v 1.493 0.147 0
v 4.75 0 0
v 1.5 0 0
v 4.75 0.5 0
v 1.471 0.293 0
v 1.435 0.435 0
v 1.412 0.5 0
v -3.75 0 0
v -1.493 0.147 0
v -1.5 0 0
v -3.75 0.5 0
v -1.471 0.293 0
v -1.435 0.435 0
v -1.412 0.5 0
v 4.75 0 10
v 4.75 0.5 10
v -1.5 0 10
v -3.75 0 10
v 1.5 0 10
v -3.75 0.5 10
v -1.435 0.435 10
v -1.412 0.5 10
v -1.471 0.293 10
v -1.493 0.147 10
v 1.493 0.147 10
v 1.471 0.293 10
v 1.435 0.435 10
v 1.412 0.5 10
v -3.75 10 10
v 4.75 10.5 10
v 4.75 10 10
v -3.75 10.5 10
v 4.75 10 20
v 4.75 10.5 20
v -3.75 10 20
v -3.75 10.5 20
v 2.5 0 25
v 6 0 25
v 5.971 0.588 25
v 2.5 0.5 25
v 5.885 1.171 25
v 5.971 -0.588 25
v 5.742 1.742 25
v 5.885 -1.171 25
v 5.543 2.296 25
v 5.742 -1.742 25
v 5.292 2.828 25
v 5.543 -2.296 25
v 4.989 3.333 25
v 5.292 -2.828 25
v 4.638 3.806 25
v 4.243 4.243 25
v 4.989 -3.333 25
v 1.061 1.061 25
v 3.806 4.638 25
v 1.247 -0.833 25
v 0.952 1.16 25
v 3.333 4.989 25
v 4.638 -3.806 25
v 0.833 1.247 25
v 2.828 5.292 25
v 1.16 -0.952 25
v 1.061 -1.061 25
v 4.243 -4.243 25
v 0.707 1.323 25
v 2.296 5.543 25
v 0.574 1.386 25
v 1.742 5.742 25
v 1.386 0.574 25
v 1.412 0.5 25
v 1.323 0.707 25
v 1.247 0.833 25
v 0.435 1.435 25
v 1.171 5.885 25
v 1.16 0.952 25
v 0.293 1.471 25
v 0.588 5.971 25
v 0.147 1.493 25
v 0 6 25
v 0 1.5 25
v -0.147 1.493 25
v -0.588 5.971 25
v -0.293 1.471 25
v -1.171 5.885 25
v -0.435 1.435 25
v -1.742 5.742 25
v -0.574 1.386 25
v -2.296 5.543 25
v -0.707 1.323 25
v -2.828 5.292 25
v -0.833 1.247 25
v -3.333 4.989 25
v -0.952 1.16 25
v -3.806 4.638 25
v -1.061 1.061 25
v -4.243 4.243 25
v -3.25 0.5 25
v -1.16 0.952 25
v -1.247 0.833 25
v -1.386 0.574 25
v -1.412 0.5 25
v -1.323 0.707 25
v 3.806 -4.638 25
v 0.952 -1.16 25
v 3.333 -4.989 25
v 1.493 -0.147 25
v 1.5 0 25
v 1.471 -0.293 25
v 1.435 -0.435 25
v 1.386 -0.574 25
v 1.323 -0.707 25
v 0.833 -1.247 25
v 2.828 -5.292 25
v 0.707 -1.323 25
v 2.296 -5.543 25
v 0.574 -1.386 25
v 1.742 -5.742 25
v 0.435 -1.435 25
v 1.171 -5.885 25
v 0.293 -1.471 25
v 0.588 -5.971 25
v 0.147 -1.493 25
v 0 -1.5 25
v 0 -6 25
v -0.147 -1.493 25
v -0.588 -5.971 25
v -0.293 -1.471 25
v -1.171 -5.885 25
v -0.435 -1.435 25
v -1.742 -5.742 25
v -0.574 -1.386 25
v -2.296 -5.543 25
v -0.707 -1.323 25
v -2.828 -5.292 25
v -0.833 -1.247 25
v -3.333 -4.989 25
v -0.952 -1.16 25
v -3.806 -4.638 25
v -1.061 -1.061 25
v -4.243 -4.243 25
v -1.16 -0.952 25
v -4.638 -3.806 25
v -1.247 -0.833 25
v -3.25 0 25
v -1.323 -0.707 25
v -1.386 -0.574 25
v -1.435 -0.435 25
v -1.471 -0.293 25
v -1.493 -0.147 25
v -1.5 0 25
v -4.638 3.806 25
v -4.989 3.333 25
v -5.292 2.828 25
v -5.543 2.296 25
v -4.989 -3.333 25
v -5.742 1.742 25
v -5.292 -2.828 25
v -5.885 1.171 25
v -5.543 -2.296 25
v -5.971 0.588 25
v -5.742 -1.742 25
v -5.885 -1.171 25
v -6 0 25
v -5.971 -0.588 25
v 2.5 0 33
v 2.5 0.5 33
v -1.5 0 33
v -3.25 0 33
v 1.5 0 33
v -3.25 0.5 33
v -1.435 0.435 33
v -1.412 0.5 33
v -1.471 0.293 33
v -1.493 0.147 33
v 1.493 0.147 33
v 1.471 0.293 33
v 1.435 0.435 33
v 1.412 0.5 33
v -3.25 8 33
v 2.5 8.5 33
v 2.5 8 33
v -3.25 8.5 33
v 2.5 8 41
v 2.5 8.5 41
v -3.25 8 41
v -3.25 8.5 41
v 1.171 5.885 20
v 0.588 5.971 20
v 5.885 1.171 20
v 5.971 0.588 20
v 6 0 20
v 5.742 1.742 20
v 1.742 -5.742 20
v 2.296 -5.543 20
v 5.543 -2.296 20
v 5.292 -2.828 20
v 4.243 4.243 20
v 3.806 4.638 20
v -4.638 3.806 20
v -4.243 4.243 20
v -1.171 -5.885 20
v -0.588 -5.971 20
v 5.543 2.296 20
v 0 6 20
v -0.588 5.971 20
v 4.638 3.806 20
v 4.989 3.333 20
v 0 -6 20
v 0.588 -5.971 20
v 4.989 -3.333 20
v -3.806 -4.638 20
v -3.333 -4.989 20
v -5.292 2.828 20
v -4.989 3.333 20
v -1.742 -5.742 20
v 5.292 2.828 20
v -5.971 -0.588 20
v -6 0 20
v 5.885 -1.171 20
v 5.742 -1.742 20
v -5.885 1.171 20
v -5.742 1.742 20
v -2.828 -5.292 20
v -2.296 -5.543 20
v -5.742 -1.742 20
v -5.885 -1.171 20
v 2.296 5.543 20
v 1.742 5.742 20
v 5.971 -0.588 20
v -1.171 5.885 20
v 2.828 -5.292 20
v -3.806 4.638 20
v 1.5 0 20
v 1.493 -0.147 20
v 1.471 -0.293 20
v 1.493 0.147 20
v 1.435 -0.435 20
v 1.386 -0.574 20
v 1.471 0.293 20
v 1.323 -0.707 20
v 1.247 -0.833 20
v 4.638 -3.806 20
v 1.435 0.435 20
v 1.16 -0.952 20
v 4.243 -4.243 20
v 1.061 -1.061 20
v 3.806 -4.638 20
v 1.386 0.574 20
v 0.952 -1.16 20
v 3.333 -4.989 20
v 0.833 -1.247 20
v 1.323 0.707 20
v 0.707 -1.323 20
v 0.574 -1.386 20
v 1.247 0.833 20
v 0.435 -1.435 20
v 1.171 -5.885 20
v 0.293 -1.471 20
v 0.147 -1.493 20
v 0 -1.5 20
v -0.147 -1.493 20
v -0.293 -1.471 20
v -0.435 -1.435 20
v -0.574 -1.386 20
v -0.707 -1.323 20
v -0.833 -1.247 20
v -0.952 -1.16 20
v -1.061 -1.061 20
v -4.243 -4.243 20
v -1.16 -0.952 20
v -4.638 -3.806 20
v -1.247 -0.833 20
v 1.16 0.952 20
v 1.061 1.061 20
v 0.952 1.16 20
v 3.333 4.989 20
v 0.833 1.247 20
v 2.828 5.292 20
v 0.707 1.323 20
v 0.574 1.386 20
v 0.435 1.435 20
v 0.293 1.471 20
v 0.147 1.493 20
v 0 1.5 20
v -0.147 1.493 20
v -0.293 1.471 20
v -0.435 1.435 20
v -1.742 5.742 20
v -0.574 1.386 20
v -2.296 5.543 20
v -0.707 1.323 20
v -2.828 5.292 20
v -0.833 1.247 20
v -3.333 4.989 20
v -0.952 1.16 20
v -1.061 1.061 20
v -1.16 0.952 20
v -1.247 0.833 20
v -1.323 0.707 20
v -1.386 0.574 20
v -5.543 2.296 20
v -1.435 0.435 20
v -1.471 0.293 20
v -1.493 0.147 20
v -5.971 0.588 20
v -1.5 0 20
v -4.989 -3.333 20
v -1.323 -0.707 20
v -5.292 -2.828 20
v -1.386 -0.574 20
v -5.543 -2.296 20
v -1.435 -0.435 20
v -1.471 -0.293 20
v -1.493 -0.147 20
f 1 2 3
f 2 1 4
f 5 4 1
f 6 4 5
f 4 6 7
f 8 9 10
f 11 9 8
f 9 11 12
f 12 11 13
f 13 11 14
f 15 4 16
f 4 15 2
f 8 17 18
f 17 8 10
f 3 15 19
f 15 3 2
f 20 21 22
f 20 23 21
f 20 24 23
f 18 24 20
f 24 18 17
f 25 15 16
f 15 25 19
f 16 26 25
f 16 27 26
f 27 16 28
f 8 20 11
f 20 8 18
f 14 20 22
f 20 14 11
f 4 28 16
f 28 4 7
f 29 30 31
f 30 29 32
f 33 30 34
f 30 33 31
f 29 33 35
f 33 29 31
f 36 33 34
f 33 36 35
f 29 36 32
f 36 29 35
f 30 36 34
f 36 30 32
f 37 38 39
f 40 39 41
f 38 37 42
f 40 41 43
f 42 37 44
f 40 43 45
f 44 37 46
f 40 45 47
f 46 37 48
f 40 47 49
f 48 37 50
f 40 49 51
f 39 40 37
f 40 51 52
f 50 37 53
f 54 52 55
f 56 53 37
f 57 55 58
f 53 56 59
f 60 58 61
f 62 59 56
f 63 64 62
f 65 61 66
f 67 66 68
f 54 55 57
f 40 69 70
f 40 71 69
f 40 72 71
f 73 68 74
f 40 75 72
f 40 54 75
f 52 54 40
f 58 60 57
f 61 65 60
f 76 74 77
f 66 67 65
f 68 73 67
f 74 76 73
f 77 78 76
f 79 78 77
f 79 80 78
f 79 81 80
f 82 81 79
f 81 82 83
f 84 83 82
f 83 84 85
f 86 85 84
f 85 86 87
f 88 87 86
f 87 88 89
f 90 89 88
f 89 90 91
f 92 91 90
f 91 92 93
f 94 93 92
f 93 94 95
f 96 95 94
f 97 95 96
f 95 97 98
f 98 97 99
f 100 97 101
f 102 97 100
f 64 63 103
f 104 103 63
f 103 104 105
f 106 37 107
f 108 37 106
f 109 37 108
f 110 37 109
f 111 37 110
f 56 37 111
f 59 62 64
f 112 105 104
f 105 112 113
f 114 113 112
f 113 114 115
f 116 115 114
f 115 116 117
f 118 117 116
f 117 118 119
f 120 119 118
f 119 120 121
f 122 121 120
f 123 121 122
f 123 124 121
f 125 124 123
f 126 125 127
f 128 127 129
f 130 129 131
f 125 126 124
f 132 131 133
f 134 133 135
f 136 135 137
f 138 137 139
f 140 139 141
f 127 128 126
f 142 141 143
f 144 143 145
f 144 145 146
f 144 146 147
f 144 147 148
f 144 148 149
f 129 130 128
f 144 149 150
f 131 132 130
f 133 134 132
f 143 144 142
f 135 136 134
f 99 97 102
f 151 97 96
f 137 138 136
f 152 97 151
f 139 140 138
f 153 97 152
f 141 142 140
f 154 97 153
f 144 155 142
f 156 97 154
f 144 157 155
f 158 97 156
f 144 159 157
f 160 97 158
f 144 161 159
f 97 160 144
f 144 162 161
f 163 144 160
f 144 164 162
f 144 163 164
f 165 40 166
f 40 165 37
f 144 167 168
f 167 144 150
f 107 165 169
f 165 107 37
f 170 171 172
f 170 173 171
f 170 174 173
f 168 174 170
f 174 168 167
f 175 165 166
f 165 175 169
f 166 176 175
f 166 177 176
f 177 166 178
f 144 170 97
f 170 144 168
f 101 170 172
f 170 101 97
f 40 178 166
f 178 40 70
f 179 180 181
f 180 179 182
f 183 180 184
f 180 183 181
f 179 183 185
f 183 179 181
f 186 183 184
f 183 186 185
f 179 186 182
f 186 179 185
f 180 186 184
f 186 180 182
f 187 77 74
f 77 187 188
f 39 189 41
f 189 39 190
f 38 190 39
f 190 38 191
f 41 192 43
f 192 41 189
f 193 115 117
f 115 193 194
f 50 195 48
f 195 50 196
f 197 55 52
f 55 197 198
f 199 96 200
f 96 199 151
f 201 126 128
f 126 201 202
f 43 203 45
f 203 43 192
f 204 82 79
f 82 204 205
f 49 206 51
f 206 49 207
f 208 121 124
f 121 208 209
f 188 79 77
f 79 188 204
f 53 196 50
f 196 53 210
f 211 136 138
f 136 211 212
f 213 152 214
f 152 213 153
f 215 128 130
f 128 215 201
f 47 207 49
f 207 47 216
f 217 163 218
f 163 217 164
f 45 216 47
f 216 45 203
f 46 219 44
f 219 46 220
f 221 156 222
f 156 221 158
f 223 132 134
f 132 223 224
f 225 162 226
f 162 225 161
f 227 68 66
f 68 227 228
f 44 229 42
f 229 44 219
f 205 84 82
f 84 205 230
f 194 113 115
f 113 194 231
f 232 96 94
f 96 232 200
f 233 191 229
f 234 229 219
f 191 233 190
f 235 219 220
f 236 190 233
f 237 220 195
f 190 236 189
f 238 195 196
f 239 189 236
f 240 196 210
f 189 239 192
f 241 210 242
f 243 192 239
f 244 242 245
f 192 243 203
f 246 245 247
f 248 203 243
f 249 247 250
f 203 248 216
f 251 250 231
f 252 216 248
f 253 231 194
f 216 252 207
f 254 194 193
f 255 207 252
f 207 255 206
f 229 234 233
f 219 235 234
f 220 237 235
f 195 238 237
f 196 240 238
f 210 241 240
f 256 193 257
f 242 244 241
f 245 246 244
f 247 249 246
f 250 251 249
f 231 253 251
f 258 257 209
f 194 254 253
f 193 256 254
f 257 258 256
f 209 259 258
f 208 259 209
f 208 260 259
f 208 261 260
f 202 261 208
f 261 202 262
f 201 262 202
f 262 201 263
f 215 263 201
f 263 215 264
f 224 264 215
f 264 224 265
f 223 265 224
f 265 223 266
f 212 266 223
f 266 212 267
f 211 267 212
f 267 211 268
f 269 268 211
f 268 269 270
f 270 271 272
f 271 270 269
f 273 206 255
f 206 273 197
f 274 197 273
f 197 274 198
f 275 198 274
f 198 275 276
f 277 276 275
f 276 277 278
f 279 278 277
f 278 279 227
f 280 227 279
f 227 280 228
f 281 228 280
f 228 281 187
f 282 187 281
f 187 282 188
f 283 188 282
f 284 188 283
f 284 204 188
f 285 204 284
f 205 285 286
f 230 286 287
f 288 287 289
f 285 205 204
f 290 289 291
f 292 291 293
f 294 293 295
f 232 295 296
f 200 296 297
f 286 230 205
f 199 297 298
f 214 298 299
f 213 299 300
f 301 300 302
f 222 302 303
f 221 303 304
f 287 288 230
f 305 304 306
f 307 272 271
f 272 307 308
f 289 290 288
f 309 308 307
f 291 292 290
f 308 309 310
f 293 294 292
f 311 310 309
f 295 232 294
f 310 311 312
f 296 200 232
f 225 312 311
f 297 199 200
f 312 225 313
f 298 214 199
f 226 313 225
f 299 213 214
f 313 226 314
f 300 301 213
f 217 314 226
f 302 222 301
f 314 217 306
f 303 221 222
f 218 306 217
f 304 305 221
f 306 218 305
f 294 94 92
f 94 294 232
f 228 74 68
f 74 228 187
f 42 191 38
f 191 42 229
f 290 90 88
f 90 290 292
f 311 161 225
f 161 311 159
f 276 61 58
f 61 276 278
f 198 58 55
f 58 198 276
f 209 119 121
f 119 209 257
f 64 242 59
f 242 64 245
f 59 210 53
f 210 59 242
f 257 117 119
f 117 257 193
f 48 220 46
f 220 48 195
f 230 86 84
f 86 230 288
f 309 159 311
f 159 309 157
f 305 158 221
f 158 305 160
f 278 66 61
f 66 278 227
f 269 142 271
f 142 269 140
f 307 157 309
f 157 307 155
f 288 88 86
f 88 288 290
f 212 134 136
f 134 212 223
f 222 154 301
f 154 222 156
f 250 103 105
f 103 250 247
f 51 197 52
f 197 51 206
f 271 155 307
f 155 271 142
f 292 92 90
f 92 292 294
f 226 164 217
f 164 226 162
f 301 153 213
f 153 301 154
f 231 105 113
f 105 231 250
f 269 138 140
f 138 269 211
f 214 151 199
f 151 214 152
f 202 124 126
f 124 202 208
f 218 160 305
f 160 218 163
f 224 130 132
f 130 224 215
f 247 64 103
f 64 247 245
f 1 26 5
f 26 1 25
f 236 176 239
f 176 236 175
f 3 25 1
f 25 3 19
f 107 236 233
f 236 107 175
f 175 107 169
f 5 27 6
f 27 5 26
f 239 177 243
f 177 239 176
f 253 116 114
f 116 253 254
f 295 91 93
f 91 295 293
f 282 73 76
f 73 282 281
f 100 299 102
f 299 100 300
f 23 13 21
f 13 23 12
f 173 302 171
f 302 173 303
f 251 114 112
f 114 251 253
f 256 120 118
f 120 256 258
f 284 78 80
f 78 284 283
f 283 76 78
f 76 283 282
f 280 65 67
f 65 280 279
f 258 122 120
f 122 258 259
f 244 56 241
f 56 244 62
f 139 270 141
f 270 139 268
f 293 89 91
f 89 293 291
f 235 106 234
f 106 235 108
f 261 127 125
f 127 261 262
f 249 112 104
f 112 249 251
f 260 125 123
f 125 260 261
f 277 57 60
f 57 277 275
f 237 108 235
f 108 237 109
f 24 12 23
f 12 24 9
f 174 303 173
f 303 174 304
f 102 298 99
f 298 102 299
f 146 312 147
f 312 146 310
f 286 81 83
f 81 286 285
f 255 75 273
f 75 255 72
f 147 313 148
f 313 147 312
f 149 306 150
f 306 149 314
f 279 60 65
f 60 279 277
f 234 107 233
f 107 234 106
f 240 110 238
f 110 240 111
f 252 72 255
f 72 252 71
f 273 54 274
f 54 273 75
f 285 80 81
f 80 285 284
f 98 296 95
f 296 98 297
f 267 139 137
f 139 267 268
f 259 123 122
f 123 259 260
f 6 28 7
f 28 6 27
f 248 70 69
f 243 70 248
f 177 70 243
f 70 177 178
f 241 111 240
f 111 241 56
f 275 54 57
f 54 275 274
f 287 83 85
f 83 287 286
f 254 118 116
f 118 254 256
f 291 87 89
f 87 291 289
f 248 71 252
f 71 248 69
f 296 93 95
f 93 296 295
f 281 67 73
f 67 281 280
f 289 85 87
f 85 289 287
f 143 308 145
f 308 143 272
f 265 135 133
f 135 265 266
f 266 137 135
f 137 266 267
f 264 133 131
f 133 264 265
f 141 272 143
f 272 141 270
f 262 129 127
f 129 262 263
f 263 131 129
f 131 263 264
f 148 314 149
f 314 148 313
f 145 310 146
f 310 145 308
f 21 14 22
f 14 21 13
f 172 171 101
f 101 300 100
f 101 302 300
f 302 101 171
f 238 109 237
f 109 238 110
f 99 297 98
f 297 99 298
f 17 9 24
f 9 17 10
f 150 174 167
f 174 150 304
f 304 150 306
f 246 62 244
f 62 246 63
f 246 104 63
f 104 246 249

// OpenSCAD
// Hose-barb reducer: 8 mm ID -> 5 mm ID
// Print orientation: standing upright along +Z

$fn = 64;

// ---- Dimensions (mm) ----
bore        = 3;    // through-bore diameter
tube_id1    = 8;    // larger tubing inner diameter
tube_id2    = 5;    // smaller tubing inner diameter
barb_h1     = 10;   // height of each 8 mm barb
barb_od1_b  = 7.5;  // 8 mm barb outer diameter at bottom
barb_od1_t  = 9.5;  // 8 mm barb outer diameter at top
collar_d    = 12;   // collar diameter (z = 20 to 25)
barb_h2     = 8;    // height of each 5 mm barb
barb_od2_b  = 6.5;  // 5 mm barb outer diameter at bottom
barb_od2_t  = 5.0;  // 5 mm barb outer diameter at top
total_h     = 41;   // overall height

eps = 0.5;          // overlap for clean boolean cuts

// ---- Derived ----
z0 = 0;
z1 = barb_h1;       // top of first 8 mm barb
z2 = z1 + barb_h1;  // top of second 8 mm barb / bottom of collar
z3 = z2 + 5;        // top of collar
z4 = z3 + barb_h2;  // top of first 5 mm barb
z5 = z4 + barb_h2;  // top of second 5 mm barb (= total_h)

// ---- Model ----
difference() {
    union() {
        // 8 mm tubing barbs (sawtooth profile)
        for (i = [0 : 1])
            translate([0, 0, z0 + i * barb_h1])
                linear_extrude(height = barb_h1)
                    polygon([
                        [-barb_od1_b / 2, i * barb_h1],
                        [ barb_od1_t / 2, i * barb_h1],
                        [ barb_od1_t / 2, i * barb_h1 + eps],
                        [-barb_od1_b / 2, i * barb_h1 + eps]
                    ]);

        // Collar
        translate([0, 0, z2])
            cylinder(d = collar_d, h = 5);

        // 5 mm tubing barbs (sawtooth profile)
        for (i = [0 : 1])
            translate([0, 0, z3 + i * barb_h2])
                linear_extrude(height = barb_h2)
                    polygon([
                        [-barb_od2_b / 2, i * barb_h2],
                        [ barb_od2_t / 2, i * barb_h2],
                        [ barb_od2_t / 2, i * barb_h2 + eps],
                        [-barb_od2_b / 2, i * barb_h2 + eps]
                    ]);
    }

    // Through-bore
    translate([0, 0, -eps])
        cylinder(d = bore, h = total_h + 2 * eps);
}
